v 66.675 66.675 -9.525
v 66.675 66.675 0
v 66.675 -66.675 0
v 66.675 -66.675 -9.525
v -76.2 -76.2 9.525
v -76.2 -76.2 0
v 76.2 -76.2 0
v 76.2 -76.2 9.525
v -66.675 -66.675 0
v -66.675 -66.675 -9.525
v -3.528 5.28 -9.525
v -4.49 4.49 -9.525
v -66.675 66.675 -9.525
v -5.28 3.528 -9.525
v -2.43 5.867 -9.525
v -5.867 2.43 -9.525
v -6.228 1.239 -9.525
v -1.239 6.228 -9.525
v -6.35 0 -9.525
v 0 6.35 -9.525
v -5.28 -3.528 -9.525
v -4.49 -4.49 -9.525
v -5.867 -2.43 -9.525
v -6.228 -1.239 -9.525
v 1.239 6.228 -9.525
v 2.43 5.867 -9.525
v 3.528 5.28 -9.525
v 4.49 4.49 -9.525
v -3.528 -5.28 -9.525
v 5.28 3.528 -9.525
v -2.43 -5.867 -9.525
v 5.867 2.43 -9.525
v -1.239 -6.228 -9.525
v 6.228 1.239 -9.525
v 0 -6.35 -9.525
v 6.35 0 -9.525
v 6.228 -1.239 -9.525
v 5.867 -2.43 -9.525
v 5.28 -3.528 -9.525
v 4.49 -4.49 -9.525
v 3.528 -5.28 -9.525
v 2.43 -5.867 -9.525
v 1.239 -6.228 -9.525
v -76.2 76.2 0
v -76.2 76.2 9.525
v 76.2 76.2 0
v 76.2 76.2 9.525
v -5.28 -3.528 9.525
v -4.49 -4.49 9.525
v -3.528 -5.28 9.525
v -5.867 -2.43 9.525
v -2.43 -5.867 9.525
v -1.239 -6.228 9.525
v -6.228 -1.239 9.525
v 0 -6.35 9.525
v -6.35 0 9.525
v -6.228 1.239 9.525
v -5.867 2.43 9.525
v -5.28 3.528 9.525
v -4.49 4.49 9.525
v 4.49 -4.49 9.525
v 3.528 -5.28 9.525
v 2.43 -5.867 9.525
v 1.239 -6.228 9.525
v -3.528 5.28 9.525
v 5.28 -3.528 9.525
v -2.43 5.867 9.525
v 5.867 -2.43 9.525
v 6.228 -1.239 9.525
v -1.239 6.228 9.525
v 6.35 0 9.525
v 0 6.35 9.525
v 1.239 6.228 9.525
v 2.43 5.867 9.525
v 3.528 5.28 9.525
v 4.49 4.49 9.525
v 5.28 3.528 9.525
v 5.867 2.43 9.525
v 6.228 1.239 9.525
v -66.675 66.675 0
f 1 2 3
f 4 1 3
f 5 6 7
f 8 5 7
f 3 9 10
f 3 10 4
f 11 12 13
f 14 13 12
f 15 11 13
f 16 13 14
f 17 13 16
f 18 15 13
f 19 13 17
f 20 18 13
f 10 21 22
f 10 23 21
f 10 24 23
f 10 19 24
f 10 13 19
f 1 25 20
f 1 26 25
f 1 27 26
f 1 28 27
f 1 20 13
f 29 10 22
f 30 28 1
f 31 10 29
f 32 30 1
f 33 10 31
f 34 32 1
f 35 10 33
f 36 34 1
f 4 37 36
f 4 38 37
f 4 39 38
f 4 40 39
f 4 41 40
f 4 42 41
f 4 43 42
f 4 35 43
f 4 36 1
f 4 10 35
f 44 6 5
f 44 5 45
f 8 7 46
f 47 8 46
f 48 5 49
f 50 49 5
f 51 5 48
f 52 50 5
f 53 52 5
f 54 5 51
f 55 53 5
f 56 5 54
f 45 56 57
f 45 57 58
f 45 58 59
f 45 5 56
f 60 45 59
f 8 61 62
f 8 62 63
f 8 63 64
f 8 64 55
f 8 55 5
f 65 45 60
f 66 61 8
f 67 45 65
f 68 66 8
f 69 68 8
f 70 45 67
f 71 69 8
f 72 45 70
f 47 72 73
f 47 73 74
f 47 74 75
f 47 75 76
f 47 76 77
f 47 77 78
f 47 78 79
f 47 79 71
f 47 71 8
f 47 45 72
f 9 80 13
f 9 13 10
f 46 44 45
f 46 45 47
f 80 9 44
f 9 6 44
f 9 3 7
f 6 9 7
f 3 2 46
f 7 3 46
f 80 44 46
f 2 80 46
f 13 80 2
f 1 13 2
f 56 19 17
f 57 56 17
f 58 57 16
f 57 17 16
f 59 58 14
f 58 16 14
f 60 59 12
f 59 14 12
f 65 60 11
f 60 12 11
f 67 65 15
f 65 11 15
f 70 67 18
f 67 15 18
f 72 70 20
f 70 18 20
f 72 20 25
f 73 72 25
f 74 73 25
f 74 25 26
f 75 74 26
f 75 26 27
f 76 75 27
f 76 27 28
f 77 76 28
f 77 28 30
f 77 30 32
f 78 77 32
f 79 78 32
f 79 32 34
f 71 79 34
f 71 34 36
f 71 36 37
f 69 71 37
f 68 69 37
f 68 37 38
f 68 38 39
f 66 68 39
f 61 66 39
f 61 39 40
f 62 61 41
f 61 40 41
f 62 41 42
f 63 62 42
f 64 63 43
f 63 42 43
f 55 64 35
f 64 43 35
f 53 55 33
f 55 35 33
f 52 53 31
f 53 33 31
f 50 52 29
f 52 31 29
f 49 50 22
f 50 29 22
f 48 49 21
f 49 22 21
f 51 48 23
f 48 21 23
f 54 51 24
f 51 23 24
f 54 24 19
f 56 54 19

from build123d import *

# Parameters (mm, degrees)
F0_W     = 152.4
F0_H     = 152.4
F1_DEPTH = 9.525
F2_W     = 133.35
F2_H     = 133.35
F3_DEPTH = 9.525
F5_D     = 12.7


with BuildPart() as f1:
    # F0 (on Top) → F1 (new body)
    with BuildSketch(Plane.XY):
        Rectangle(F0_W, F0_H)
    extrude(amount=F1_DEPTH)

    # F2 (on face) → F3 (join)
    with BuildSketch(Plane(origin=(0, 0, 0), x_dir=(1, 0, 0), z_dir=(0, 0, -1))):
        Rectangle(F2_W, F2_H)
    extrude(amount=F3_DEPTH)

    # F5 (through all)
    with Locations(Plane.XY.offset(9.525)):
        with Locations((0, 0)):
            Hole(F5_D / 2)


solid = f1.part
